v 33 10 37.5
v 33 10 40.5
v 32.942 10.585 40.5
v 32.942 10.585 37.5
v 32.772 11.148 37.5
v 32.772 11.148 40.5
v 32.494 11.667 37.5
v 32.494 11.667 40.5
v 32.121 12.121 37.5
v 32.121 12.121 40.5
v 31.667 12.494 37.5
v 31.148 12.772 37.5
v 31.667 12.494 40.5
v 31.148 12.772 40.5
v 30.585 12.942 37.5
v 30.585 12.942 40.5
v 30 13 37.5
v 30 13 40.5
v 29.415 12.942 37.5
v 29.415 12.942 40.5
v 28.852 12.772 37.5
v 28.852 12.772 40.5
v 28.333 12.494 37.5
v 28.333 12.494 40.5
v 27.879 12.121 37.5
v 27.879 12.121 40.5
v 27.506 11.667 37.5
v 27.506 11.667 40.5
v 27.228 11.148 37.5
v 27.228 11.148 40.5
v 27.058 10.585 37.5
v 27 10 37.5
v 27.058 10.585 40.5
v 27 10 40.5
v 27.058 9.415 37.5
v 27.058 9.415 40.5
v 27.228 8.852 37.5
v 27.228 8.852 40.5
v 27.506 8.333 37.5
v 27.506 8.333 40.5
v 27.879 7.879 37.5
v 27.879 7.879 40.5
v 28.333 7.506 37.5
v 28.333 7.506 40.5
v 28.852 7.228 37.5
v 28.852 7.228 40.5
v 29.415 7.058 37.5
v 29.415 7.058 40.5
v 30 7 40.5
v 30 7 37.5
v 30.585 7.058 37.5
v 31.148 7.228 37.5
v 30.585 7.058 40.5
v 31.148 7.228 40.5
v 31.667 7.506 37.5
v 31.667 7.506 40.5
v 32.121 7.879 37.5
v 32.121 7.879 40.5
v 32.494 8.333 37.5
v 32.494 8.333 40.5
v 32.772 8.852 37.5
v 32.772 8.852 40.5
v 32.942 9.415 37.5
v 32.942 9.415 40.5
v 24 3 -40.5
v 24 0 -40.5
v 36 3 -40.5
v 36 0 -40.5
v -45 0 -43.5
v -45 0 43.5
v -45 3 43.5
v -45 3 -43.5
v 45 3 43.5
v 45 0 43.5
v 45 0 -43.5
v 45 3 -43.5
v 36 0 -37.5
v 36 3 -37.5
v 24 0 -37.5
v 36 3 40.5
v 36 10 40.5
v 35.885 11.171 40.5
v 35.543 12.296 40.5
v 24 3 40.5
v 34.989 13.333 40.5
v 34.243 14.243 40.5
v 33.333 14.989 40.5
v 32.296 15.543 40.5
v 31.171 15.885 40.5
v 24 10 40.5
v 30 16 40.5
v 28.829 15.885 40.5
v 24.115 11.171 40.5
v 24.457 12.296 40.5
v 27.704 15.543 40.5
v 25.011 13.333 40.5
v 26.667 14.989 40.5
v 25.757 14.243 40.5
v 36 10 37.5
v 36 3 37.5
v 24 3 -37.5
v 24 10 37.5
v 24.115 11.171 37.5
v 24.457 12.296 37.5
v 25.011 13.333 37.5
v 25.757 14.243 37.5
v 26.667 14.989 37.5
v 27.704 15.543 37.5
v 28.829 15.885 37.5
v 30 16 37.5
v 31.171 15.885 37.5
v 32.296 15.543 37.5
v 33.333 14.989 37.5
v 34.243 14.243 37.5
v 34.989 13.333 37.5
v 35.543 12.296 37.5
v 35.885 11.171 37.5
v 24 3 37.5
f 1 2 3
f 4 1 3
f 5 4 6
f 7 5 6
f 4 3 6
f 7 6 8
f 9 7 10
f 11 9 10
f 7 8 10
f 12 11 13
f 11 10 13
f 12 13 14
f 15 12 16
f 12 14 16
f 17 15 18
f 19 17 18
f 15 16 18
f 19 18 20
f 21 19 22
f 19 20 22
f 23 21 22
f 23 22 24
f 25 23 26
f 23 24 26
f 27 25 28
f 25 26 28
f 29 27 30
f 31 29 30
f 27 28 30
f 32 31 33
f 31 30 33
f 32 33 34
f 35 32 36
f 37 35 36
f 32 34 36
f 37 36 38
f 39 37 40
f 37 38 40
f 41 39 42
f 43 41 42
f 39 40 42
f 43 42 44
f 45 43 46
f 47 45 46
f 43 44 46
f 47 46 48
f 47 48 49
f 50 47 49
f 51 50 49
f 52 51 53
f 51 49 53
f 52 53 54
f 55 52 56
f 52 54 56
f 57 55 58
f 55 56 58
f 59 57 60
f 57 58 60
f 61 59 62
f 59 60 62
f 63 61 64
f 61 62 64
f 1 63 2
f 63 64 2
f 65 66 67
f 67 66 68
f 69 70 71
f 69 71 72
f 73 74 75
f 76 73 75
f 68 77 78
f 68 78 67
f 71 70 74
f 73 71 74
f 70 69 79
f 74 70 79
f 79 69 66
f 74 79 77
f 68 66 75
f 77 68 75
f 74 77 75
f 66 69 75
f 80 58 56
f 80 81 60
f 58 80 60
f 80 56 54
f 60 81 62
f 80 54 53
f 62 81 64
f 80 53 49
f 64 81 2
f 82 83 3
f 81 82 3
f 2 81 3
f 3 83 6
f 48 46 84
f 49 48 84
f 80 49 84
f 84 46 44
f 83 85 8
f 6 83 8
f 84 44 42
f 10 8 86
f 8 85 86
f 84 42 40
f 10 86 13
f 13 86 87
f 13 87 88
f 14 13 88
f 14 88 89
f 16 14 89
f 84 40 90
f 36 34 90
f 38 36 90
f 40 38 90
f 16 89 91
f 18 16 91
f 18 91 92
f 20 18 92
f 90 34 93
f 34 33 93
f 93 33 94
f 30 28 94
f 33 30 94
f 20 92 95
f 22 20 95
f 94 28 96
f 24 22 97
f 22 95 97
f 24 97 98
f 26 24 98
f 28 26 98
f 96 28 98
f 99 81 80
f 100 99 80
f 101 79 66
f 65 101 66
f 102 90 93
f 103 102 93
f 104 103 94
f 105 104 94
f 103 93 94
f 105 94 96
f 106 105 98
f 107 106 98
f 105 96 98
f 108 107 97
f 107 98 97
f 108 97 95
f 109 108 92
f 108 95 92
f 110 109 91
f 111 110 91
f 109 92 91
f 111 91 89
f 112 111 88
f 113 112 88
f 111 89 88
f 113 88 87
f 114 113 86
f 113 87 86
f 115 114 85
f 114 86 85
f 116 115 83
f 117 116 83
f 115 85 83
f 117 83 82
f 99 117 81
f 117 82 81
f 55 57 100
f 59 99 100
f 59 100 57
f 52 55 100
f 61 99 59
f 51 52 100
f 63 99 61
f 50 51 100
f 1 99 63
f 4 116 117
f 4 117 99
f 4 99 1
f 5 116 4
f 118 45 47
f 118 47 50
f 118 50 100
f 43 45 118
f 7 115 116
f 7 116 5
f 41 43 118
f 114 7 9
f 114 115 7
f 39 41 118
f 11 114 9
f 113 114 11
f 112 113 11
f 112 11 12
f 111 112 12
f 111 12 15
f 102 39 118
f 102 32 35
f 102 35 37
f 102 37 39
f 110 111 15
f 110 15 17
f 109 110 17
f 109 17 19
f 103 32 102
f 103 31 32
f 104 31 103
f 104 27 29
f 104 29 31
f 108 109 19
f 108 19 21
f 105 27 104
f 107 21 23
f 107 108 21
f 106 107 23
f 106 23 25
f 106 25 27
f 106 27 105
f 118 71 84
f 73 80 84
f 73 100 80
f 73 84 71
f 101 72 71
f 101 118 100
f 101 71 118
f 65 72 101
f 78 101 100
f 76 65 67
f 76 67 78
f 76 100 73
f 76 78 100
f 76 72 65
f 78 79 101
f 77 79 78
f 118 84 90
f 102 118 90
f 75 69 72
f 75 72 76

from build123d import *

# Parameters (mm, degrees)
SKETCH1_W           = 90
SKETCH1_H           = 87
SKETCH1_W_2         = 12
SKETCH1_H_2         = 3
BOSS_EXTRUDE1_DEPTH = 3
SKETCH3_R           = 3
BOSS_EXTRUDE2_DEPTH = 3


with BuildPart() as part:
    # Sketch1 → Boss-Extrude1 (new body)
    with BuildSketch(Plane(origin=(0, 0, 0), x_dir=(1, 0, 0), z_dir=(0, 1, 0))):
        Rectangle(SKETCH1_W, SKETCH1_H)
        with Locations((30, 39)):
            Rectangle(SKETCH1_W_2, SKETCH1_H_2, mode=Mode.SUBTRACT)
    extrude(amount=BOSS_EXTRUDE1_DEPTH)

    # Sketch3 → Boss-Extrude2 (add)
    with BuildSketch(Plane.XY.offset(40.5)):
        with BuildLine():
            Line((24, 3), (24, 10))
            ThreePointArc((24, 10), (30, 16), (36, 10))
            Line((36, 10), (36, 3))
            Line((36, 3), (24, 3))
        make_face()
        with Locations((30, 10)):
            Circle(SKETCH3_R, mode=Mode.SUBTRACT)
    extrude(amount=-BOSS_EXTRUDE2_DEPTH)


solid = part.part
